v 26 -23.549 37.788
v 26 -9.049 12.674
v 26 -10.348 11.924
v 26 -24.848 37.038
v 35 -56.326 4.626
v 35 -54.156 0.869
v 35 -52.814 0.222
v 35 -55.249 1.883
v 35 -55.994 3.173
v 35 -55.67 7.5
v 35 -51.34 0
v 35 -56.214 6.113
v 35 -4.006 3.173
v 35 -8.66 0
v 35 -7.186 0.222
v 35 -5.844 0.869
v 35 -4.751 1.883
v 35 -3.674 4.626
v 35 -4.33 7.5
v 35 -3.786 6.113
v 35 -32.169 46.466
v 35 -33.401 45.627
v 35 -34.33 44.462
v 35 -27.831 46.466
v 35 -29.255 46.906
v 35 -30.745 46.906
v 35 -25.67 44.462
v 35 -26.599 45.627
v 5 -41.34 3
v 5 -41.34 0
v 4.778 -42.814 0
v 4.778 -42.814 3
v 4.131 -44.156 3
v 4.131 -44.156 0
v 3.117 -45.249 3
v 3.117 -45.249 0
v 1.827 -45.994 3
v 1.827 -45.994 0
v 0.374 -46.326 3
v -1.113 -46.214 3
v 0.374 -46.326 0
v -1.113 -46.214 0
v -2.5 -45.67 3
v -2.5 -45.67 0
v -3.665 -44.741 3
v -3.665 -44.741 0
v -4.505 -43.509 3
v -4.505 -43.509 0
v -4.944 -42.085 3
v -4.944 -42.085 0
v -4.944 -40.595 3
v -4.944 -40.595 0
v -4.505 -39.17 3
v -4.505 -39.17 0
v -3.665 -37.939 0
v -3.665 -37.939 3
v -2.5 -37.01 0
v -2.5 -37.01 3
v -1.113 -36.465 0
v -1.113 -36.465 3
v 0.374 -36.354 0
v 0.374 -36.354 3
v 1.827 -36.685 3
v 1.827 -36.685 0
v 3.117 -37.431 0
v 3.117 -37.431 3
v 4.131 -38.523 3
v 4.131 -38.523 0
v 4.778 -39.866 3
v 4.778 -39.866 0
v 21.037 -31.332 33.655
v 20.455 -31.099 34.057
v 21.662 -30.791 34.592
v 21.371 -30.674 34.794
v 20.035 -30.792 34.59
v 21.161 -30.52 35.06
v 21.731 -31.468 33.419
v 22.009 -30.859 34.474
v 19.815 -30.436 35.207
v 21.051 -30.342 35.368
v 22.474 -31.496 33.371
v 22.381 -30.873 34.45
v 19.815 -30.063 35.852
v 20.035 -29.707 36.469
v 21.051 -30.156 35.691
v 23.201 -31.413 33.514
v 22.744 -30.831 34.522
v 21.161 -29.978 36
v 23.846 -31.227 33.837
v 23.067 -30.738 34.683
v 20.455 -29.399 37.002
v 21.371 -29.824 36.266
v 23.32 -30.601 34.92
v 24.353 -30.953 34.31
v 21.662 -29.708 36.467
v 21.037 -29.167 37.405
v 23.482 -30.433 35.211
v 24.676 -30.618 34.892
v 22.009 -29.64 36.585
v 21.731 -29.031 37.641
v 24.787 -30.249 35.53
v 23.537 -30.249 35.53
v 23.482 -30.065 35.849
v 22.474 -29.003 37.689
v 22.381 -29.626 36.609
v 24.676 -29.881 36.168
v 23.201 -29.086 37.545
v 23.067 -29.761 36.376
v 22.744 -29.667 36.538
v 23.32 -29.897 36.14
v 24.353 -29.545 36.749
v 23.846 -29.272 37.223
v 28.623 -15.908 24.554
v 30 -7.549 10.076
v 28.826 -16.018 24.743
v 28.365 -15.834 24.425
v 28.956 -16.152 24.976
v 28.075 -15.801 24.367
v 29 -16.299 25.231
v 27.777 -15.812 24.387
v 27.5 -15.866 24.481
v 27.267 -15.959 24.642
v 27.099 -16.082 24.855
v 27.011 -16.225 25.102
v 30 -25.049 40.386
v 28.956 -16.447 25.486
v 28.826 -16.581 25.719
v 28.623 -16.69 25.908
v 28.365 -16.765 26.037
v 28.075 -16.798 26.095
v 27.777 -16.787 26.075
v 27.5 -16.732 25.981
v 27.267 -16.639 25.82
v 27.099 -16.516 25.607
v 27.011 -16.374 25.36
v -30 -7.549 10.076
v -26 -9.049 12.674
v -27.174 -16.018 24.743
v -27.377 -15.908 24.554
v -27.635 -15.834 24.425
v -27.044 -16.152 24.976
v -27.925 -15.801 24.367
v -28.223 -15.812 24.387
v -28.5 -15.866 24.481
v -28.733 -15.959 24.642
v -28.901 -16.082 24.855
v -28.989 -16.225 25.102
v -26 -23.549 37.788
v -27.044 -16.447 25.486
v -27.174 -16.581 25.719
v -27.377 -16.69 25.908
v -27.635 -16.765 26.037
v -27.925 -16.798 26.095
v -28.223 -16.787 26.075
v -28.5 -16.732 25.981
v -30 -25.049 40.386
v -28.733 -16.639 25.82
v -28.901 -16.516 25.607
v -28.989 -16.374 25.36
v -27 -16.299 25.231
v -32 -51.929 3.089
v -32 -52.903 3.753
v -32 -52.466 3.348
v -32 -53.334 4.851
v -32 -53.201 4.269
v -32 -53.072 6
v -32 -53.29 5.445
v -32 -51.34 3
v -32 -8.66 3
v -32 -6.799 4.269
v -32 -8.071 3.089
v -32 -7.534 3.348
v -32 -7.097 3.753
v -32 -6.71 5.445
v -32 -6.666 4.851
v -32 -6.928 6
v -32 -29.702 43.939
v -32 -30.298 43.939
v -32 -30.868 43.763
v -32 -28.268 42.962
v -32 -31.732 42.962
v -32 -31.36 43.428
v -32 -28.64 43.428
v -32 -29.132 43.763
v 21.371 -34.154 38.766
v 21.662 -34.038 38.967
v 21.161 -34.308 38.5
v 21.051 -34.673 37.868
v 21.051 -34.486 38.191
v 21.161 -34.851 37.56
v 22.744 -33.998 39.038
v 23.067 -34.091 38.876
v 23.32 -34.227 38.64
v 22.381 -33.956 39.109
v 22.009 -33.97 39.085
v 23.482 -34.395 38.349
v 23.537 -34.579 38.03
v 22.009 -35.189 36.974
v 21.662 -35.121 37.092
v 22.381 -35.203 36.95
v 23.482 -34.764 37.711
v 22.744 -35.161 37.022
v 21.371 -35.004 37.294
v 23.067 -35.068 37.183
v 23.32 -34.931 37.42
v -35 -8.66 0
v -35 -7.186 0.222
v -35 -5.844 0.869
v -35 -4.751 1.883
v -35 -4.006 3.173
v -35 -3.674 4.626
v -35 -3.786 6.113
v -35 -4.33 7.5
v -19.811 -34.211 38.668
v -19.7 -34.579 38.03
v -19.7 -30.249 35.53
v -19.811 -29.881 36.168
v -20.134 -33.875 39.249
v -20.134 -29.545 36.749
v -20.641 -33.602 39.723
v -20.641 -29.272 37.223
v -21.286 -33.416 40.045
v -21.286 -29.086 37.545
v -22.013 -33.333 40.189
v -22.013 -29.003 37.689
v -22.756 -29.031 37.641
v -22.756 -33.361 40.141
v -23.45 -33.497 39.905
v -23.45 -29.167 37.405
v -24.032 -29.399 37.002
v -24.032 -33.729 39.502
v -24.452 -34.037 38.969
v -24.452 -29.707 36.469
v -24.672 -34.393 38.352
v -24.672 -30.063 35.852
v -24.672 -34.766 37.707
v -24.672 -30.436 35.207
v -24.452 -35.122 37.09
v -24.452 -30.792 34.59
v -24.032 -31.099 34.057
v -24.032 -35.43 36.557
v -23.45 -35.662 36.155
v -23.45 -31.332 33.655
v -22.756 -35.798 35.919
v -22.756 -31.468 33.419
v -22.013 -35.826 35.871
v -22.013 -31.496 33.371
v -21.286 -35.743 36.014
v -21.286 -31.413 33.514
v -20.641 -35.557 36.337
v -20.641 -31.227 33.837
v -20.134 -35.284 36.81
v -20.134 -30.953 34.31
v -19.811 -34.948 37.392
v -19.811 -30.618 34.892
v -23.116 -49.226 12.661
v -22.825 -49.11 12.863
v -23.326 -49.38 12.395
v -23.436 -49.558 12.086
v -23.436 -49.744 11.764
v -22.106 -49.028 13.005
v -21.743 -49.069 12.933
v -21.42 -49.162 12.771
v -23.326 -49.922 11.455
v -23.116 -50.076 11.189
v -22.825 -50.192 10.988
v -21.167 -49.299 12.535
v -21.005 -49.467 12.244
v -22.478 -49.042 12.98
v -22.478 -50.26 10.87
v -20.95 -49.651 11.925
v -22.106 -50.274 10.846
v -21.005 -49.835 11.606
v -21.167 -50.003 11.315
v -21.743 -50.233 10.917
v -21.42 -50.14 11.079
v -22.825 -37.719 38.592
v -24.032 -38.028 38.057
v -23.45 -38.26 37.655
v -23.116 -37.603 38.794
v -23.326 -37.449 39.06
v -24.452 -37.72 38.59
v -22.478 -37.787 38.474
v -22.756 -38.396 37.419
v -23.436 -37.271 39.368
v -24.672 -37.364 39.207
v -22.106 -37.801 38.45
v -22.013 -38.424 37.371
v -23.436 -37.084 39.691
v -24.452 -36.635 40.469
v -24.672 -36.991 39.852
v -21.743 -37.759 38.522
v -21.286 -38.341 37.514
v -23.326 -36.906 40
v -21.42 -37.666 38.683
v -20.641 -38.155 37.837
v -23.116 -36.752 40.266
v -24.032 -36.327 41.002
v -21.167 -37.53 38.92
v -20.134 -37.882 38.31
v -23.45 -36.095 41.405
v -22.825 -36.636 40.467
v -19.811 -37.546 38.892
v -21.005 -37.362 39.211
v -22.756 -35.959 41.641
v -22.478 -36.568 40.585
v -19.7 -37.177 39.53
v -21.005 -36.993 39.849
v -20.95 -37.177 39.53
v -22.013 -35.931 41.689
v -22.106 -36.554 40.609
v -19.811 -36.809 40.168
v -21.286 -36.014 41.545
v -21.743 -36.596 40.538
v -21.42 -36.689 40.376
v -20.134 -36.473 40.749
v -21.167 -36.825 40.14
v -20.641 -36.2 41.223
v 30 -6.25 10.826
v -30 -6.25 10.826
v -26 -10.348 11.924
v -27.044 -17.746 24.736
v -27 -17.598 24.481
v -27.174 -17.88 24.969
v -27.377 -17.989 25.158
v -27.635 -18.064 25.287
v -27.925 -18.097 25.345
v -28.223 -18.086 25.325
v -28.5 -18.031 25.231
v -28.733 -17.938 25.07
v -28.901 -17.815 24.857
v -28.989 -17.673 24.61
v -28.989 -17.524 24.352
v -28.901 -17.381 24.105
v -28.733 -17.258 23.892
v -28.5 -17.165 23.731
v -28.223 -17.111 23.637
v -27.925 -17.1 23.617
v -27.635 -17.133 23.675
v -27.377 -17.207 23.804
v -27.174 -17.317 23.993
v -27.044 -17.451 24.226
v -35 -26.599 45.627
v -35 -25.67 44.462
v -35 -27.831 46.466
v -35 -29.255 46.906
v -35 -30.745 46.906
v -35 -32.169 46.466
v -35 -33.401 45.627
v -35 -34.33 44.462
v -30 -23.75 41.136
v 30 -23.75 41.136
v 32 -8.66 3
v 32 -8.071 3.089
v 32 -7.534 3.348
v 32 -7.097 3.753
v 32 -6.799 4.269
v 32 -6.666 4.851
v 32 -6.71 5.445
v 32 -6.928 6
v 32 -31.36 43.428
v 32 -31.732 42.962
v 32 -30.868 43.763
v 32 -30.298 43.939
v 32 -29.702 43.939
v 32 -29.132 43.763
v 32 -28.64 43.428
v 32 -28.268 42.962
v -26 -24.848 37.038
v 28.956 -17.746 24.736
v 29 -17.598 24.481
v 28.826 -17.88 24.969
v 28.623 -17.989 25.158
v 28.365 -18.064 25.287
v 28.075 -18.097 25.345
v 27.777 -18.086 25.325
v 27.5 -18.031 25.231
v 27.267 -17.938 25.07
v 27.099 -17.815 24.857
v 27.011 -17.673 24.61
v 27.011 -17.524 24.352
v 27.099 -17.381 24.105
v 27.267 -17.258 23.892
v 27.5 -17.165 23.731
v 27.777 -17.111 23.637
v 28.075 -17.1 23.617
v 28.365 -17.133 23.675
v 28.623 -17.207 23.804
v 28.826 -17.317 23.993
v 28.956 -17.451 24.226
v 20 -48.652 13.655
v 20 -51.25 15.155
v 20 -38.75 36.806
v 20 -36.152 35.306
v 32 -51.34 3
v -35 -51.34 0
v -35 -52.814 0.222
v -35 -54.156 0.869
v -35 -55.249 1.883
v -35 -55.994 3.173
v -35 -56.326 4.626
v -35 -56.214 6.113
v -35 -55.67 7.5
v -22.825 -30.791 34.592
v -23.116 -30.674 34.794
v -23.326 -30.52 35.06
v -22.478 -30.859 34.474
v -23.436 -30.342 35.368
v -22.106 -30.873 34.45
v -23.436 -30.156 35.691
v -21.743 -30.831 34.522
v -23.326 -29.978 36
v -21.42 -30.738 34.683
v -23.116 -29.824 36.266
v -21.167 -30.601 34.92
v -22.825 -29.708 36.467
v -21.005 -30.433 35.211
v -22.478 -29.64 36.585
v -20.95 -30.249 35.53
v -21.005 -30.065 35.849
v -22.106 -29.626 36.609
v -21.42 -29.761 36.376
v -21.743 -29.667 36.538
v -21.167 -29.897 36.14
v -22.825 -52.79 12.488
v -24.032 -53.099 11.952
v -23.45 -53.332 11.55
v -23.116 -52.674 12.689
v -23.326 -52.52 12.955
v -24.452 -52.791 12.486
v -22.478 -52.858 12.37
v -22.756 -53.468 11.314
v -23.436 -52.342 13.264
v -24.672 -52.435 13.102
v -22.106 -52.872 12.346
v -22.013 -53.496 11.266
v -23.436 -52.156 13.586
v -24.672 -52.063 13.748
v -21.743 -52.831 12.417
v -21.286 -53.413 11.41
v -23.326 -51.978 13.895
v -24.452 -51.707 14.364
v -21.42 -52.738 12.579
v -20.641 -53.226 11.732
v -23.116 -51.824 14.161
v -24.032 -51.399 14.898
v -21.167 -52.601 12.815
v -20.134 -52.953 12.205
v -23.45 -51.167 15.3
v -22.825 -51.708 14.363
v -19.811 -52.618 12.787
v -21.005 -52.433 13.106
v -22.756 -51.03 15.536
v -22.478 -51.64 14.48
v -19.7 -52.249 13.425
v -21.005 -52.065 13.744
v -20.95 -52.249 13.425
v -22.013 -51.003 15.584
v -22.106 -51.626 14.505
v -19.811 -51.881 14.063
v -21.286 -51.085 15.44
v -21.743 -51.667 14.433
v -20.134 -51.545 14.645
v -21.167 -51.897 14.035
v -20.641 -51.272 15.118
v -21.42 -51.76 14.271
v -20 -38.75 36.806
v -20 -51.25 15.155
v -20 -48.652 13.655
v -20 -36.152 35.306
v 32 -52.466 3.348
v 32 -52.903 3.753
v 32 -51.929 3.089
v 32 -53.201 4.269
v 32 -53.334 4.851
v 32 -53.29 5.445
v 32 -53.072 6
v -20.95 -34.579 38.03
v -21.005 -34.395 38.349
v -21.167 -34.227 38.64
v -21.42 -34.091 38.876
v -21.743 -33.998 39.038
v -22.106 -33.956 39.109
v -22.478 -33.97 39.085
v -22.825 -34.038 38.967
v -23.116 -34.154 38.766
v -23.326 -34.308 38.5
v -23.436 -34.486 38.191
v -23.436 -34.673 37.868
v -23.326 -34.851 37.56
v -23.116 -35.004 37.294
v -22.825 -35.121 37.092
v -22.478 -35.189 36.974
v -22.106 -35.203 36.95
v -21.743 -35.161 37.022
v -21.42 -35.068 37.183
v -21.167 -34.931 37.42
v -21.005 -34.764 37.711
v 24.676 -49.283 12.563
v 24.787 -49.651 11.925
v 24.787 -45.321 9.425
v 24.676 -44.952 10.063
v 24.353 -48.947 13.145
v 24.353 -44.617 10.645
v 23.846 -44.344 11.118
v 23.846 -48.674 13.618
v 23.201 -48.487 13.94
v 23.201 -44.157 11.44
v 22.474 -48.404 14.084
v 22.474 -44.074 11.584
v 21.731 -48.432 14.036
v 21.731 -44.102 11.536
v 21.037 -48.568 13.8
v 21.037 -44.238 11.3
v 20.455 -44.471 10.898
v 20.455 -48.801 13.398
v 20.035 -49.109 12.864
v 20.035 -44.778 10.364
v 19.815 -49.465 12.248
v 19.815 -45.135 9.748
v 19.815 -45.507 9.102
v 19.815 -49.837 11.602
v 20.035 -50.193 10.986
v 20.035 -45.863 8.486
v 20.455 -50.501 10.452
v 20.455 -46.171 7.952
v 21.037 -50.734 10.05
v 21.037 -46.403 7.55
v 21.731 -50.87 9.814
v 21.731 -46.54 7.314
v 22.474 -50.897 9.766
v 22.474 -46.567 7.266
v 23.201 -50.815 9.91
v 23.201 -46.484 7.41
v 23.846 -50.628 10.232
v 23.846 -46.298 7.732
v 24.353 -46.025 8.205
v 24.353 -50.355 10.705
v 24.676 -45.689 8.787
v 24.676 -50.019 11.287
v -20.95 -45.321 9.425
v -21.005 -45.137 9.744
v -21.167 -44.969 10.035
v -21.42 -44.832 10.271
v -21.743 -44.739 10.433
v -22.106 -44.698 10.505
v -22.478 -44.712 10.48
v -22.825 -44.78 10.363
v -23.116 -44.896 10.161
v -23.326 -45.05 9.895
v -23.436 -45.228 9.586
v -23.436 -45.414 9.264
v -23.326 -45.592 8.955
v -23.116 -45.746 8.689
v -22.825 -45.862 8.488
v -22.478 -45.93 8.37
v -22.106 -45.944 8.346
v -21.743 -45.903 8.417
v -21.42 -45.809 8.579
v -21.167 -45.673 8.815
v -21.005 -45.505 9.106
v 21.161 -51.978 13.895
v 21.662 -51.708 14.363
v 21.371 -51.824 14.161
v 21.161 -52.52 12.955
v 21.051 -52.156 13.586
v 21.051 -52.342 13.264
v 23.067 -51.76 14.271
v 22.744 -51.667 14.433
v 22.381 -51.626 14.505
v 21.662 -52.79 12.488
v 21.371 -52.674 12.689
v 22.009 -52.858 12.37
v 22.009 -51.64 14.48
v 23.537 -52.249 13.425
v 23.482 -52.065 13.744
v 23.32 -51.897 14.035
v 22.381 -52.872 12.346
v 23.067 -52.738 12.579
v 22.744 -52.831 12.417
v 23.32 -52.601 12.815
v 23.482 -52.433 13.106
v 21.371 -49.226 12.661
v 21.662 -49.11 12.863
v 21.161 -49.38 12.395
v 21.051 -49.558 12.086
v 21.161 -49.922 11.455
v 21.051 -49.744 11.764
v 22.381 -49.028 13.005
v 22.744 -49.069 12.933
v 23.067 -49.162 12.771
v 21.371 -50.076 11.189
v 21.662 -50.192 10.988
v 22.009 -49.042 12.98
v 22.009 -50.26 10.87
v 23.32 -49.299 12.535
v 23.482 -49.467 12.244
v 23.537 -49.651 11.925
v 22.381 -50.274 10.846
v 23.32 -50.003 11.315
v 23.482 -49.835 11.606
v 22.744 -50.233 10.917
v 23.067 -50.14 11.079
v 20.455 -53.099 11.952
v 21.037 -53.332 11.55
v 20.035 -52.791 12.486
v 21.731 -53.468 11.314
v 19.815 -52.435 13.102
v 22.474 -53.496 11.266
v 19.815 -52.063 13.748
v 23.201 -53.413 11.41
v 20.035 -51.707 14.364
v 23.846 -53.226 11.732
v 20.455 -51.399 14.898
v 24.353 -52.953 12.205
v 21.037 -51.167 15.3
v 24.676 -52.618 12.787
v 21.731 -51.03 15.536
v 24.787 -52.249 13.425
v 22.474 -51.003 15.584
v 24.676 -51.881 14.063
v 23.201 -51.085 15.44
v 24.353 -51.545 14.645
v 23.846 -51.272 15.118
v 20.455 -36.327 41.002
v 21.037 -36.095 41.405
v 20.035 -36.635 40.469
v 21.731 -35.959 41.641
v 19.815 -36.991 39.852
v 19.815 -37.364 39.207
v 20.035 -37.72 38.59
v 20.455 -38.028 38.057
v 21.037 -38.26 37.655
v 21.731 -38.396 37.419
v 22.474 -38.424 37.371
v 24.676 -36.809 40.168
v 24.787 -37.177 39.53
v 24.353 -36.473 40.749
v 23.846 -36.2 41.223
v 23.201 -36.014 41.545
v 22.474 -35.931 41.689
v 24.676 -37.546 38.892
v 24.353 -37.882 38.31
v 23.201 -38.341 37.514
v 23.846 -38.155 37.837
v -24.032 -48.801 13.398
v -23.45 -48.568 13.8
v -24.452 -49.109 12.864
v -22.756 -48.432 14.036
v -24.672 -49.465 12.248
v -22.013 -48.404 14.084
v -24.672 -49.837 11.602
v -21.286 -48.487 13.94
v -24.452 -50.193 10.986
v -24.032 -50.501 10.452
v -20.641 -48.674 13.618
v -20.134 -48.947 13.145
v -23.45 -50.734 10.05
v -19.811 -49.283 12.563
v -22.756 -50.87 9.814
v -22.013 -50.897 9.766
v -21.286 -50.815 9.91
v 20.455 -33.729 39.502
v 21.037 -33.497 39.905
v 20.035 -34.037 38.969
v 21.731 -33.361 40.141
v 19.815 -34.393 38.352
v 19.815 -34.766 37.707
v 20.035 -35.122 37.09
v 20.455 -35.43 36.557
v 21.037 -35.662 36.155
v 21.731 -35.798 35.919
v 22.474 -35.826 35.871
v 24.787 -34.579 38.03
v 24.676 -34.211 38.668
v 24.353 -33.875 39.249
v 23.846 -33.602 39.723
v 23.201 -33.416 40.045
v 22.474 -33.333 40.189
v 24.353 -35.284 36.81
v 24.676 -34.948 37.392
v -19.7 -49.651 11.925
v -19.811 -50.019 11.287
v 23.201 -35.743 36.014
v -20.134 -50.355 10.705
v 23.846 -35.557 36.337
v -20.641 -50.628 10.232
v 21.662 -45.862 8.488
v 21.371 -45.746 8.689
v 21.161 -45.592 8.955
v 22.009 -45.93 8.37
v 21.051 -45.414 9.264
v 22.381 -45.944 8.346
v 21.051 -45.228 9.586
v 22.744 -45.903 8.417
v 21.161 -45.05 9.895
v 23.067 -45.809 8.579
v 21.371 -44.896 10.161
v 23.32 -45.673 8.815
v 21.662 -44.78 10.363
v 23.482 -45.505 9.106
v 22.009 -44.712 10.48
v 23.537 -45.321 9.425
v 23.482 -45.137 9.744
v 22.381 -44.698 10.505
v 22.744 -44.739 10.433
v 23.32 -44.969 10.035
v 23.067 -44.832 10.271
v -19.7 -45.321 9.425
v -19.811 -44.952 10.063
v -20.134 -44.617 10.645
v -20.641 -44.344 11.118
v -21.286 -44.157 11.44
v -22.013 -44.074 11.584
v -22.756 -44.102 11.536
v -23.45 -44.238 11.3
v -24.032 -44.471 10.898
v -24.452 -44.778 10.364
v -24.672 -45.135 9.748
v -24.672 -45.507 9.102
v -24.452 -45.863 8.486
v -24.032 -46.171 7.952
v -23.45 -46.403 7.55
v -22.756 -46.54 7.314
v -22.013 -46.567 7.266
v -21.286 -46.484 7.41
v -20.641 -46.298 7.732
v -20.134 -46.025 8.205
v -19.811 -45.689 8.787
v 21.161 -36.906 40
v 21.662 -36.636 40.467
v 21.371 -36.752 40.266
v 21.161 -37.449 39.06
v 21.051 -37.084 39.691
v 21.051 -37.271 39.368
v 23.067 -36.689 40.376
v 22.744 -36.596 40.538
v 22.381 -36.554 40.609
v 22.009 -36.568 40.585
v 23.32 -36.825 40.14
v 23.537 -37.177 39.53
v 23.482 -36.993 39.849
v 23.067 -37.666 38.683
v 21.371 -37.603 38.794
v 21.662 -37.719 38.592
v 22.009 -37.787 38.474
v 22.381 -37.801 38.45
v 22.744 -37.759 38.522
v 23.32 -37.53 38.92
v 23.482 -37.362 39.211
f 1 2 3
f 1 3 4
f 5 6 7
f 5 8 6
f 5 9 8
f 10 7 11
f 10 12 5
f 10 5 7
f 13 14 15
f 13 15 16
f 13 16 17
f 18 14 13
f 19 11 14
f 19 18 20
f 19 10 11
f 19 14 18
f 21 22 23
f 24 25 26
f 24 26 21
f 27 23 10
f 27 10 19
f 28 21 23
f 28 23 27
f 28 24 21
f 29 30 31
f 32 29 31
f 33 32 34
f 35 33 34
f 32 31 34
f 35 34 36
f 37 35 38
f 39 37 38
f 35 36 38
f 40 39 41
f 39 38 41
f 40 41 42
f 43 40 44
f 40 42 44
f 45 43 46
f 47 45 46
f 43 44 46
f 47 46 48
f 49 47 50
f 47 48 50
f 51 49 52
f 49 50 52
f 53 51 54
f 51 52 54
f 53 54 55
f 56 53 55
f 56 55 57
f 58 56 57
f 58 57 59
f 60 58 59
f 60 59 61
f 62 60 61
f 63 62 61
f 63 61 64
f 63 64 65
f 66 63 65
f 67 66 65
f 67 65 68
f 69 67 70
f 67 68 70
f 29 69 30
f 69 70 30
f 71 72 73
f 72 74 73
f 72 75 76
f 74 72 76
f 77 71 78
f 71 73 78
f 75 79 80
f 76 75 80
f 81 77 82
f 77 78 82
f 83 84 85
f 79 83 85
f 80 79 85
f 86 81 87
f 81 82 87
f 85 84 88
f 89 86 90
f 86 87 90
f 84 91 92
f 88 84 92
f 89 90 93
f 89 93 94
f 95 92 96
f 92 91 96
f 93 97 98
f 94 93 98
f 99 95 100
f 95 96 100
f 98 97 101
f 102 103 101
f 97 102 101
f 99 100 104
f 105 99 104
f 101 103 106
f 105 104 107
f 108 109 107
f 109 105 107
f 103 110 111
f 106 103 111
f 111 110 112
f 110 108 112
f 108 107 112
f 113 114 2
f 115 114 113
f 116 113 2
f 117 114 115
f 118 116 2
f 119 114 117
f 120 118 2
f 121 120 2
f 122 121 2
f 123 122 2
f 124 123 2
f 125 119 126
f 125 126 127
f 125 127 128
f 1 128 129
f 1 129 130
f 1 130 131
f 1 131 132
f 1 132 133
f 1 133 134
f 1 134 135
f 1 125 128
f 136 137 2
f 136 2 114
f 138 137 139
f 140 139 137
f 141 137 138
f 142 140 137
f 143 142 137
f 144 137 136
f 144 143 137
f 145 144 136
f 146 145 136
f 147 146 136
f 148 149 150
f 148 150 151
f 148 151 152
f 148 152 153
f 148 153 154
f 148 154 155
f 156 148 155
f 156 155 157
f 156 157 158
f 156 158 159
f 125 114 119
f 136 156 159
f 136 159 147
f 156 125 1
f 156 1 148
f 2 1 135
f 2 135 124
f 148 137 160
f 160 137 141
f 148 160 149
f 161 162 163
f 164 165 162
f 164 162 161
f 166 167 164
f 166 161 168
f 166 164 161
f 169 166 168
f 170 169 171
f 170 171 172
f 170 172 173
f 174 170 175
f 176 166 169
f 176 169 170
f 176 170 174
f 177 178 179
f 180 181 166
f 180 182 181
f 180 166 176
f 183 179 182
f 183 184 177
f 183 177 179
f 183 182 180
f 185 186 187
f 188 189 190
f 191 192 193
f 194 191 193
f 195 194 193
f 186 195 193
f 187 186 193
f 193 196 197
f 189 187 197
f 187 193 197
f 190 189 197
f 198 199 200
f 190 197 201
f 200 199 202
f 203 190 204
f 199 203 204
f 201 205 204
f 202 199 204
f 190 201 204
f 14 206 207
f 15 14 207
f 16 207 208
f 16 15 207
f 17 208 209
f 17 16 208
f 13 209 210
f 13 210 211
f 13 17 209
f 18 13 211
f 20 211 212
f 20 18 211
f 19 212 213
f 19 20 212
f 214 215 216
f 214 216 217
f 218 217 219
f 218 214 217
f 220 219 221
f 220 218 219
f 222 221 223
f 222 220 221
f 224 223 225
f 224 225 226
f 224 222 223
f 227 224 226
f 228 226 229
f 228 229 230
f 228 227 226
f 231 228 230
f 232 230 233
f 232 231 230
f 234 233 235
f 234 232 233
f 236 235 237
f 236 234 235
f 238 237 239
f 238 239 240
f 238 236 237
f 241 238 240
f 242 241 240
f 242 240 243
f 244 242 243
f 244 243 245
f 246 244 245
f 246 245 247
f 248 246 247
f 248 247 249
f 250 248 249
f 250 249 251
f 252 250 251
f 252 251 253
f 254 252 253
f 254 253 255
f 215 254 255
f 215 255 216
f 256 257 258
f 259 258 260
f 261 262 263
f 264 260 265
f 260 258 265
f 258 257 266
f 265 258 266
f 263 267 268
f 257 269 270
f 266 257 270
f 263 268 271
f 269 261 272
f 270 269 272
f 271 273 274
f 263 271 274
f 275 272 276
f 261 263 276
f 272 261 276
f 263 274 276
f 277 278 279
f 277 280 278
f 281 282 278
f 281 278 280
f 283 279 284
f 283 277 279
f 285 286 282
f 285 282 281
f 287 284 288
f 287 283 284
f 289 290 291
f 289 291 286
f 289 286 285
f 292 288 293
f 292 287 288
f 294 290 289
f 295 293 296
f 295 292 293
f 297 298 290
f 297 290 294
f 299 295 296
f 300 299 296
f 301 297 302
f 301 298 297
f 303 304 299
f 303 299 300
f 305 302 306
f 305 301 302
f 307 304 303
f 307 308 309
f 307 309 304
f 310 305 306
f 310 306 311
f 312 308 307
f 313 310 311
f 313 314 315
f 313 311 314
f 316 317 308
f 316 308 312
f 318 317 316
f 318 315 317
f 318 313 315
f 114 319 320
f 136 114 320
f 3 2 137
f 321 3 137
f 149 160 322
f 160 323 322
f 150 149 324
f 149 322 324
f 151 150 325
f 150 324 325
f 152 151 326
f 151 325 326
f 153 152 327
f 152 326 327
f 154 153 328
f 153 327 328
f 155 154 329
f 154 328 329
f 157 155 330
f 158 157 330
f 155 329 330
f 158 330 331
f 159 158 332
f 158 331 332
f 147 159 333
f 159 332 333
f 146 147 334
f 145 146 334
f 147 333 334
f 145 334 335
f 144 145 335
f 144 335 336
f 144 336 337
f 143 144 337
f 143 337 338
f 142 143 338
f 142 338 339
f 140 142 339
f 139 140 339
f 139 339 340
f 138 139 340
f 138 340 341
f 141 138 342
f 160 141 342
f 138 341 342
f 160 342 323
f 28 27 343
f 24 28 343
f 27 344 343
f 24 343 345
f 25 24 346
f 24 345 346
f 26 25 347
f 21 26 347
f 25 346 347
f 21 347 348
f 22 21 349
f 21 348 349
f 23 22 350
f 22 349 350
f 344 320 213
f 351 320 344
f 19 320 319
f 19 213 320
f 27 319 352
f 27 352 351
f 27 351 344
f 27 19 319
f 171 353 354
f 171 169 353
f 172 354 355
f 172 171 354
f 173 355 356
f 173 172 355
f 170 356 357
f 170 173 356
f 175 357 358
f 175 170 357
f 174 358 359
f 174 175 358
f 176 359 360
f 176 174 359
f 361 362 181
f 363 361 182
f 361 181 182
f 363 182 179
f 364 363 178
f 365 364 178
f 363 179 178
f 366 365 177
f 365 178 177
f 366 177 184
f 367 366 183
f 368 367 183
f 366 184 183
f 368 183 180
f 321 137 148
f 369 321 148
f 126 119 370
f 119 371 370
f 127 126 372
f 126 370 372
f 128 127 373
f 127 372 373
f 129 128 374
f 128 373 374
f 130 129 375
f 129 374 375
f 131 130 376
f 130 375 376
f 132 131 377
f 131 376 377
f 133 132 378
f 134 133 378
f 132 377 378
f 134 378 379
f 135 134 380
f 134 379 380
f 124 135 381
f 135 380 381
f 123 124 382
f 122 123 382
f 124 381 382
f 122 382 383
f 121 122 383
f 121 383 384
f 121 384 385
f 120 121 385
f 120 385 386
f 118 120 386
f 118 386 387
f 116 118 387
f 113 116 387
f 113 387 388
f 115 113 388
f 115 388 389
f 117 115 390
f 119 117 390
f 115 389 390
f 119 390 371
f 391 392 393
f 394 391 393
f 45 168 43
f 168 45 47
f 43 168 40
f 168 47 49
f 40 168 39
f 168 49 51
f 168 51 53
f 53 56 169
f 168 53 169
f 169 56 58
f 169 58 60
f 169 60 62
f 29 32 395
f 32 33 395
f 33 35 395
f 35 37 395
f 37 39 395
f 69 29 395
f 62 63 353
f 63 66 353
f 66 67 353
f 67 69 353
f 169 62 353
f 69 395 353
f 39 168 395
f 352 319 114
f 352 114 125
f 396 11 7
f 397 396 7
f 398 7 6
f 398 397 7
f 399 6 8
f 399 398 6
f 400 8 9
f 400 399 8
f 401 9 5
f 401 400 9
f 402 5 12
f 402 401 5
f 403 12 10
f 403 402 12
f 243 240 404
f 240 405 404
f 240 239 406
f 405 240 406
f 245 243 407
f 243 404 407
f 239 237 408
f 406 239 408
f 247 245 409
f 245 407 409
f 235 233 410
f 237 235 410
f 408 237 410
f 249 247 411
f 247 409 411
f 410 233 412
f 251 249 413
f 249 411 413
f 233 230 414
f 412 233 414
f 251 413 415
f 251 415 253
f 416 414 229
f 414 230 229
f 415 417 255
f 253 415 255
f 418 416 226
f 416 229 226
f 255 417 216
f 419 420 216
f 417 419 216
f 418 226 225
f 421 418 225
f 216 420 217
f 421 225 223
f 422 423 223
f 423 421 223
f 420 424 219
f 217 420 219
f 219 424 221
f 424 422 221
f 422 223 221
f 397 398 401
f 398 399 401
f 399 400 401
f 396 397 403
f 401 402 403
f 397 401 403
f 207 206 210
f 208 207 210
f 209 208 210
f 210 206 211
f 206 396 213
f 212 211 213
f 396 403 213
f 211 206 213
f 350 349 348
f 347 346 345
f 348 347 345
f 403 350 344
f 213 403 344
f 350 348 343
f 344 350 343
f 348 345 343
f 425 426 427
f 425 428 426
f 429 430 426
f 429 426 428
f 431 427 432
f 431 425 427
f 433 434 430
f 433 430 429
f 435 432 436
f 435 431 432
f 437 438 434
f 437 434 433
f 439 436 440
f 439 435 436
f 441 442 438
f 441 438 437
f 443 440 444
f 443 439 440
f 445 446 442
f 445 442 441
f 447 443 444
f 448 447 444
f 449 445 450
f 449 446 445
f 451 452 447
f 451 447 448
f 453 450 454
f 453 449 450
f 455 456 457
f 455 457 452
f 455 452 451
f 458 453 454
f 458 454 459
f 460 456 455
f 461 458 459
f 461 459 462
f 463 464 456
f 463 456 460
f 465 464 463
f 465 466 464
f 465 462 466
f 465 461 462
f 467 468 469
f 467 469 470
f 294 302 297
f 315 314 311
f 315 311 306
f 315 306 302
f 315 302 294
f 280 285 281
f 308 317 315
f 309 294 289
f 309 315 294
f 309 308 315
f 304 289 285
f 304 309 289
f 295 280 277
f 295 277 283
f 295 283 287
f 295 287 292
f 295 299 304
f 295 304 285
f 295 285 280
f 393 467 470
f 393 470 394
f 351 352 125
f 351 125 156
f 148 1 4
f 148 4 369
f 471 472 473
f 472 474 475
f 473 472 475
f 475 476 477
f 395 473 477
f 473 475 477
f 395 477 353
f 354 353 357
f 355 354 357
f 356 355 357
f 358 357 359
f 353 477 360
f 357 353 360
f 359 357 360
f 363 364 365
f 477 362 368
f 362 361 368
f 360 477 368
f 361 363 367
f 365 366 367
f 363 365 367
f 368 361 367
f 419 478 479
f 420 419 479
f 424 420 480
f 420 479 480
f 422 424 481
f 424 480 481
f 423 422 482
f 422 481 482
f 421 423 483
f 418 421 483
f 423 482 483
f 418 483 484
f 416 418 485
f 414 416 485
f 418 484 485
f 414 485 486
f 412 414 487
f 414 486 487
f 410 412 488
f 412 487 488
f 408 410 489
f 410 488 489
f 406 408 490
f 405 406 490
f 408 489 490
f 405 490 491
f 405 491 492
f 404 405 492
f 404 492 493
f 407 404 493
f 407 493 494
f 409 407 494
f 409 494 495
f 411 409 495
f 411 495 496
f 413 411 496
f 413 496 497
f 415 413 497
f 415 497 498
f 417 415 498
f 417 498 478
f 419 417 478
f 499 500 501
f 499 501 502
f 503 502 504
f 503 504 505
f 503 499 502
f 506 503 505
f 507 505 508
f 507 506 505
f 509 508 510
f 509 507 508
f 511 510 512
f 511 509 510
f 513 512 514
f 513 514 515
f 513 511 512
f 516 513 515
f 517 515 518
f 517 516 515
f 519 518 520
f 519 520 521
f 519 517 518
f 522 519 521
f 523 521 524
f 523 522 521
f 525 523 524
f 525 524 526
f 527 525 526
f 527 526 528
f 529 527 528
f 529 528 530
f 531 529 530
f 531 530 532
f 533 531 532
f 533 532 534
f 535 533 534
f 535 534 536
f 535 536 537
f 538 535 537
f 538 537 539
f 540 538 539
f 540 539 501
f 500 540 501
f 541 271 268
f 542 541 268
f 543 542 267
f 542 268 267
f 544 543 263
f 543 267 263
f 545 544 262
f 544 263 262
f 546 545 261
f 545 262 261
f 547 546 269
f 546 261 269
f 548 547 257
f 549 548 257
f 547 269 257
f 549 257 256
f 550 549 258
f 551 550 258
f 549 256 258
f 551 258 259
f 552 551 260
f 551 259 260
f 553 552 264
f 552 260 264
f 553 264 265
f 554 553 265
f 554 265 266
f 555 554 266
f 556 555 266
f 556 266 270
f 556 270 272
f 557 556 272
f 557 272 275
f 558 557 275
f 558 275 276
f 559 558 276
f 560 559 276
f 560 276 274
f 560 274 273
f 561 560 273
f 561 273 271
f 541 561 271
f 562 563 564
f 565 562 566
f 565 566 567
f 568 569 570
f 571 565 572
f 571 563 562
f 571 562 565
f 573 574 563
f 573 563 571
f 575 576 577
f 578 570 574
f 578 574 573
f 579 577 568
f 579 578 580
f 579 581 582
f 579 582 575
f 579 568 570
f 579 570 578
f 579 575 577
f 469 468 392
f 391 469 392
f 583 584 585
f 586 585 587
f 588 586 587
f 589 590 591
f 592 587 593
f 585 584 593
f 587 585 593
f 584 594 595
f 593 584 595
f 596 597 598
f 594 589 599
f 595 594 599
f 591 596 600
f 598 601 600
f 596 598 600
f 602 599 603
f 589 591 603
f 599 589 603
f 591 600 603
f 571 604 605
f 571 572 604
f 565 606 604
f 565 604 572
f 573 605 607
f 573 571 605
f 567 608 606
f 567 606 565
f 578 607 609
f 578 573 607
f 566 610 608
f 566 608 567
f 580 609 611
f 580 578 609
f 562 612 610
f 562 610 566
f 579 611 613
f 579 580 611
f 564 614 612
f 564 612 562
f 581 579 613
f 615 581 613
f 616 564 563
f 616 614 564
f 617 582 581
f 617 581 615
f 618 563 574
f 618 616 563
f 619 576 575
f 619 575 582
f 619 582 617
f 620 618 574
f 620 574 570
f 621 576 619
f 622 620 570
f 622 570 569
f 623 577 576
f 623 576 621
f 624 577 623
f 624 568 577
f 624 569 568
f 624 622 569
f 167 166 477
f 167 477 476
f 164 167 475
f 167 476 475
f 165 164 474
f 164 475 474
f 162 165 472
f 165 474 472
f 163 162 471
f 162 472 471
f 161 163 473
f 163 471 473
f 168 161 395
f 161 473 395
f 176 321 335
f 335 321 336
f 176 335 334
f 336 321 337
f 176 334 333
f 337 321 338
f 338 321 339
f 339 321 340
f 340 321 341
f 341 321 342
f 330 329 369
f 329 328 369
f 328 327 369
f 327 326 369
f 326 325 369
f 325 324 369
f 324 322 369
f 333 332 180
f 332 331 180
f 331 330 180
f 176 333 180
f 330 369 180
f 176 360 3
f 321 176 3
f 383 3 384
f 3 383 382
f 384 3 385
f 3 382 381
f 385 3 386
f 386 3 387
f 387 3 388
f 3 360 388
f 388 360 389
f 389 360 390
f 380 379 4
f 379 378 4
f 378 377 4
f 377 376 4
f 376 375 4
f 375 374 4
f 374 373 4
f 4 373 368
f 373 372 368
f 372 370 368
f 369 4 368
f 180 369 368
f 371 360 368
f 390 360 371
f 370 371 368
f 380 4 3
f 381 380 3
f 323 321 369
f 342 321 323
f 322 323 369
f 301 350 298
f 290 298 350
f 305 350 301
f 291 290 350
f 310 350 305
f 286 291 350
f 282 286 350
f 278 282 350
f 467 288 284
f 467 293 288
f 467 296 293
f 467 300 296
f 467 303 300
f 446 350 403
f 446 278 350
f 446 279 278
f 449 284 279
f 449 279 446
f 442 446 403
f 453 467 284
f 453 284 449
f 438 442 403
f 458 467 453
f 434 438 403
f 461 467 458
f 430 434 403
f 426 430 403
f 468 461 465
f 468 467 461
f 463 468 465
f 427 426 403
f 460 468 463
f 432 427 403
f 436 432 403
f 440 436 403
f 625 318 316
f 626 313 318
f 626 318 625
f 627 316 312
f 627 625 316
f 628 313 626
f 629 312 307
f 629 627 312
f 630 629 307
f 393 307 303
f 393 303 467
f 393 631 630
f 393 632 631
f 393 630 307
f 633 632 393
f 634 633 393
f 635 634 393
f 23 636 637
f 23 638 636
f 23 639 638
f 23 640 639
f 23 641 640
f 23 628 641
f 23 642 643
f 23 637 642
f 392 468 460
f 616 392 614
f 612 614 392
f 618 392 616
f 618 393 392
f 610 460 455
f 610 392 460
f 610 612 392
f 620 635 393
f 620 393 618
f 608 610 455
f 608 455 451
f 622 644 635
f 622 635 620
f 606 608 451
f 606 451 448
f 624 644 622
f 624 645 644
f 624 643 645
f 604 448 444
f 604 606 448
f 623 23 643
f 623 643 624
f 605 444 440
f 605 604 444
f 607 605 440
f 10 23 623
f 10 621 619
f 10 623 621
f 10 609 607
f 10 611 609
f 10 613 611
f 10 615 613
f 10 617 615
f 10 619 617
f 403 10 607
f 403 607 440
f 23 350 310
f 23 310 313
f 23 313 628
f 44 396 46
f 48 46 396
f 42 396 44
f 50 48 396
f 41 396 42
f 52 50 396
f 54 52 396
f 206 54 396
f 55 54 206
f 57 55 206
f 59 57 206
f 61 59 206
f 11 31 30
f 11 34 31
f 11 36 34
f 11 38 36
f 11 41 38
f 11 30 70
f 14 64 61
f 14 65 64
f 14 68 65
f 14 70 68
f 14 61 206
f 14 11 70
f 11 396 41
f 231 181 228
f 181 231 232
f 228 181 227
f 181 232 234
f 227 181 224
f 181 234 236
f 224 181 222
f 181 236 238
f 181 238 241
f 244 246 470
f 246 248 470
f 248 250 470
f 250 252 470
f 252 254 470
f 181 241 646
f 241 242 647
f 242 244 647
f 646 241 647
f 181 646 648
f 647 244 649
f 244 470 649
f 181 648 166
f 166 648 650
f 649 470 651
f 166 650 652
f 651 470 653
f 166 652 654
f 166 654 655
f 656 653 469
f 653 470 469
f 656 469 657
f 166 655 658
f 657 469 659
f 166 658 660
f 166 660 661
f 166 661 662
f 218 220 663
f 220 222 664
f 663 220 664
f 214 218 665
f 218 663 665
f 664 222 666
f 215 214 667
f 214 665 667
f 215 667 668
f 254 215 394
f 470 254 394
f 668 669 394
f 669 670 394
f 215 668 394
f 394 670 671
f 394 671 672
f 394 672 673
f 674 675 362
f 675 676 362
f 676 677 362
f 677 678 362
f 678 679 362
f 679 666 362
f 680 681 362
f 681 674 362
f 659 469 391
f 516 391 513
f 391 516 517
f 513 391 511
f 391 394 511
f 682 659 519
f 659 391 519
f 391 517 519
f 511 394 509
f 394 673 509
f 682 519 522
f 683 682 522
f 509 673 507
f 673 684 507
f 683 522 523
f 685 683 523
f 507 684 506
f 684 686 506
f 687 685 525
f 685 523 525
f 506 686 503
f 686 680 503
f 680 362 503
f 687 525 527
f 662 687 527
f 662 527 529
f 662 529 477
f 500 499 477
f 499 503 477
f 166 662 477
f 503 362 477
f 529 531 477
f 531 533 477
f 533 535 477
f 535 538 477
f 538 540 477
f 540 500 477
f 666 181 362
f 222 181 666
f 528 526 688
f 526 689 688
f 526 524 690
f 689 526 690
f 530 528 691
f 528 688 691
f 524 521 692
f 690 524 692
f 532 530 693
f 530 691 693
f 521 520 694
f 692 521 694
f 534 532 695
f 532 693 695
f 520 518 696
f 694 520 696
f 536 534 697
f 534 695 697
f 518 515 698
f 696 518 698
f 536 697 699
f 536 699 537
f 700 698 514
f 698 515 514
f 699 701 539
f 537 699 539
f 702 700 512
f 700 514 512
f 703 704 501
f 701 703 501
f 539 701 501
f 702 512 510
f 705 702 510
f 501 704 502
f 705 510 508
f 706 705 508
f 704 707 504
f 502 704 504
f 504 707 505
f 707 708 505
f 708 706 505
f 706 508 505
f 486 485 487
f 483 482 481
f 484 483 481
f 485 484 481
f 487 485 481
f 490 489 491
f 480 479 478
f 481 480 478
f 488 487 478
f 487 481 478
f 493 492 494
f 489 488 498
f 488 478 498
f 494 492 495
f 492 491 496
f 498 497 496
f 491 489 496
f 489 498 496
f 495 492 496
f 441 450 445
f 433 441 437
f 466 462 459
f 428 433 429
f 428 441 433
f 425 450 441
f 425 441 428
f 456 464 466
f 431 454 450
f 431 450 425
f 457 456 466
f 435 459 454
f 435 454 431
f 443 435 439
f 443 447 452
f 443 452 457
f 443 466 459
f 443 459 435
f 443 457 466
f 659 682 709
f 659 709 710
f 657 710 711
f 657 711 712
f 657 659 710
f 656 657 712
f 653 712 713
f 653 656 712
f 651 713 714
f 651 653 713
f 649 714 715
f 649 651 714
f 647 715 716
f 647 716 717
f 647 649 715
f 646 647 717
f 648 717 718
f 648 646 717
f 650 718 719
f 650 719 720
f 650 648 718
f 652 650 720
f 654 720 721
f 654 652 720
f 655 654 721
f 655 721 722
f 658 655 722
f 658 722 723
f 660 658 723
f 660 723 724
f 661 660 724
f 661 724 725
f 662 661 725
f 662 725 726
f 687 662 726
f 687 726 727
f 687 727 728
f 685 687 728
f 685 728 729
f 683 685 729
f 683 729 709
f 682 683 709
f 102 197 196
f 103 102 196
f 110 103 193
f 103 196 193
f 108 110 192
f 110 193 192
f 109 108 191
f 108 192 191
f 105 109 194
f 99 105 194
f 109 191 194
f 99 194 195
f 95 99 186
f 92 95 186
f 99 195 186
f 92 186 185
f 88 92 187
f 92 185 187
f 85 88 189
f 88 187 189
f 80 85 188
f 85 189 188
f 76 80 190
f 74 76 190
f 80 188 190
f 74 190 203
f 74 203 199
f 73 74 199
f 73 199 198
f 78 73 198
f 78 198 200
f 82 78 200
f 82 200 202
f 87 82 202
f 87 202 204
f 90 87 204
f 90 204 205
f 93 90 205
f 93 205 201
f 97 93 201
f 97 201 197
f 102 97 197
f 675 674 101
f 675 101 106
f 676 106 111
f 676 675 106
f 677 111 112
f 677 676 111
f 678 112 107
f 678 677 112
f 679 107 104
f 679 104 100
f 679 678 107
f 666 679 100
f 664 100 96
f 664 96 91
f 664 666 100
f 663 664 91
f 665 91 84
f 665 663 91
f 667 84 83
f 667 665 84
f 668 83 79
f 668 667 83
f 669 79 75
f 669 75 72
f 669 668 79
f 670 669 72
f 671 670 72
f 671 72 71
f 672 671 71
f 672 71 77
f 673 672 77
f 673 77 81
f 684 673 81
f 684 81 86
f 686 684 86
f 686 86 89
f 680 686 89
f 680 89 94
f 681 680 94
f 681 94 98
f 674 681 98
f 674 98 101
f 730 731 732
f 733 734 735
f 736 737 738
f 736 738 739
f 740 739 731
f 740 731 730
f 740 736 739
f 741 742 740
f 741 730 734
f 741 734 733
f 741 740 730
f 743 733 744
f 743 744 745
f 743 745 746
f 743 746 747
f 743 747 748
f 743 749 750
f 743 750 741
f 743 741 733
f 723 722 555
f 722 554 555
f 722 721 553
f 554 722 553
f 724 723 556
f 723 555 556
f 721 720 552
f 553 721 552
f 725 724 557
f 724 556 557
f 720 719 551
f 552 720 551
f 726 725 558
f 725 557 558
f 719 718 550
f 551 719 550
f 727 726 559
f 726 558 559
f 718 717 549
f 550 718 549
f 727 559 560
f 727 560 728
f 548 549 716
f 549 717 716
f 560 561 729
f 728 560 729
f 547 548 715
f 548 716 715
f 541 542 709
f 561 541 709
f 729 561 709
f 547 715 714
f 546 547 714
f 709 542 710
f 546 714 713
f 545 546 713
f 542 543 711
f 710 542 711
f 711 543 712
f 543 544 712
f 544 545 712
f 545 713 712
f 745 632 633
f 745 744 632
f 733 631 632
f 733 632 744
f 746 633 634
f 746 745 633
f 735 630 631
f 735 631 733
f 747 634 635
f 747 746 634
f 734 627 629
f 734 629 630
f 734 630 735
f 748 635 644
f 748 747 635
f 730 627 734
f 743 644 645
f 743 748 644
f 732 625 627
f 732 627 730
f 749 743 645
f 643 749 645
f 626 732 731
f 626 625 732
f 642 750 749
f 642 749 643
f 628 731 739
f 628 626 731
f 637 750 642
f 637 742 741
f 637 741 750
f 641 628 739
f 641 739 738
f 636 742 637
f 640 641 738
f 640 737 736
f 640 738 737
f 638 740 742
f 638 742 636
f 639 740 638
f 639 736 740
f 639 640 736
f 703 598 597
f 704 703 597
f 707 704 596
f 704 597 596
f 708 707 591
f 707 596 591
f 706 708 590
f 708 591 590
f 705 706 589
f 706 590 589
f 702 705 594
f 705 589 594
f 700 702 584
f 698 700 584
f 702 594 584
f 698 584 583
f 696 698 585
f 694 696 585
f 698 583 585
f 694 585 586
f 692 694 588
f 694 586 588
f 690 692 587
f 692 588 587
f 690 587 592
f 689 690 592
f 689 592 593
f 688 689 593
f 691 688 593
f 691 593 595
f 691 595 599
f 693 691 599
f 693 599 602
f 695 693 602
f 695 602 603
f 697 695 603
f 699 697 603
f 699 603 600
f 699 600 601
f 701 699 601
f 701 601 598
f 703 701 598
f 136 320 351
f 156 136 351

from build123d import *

# Parameters (mm, degrees)
F1_DEPTH  = 35
F2_DEPTH  = 32
F3_R      = 5
F4_R      = 2
F5_W      = 40
F5_H      = 25
F6_DEPTH  = 3
F5_R      = 2.5
F5_R_2    = 1.25
F7_DEPTH  = 8
F8_W      = 52
F8_H      = 29
F9_DEPTH  = 3
F8_W_2    = 60
F8_H_2    = 35
F10_DEPTH = 1.5
F11_R     = 5
F12_DEPTH = 3
F13_D     = 2
F13_DEPTH = 3
F13_TIP   = 0.600860619


with BuildPart() as f1:
    # F0 (on Right) → F1 (new body, symmetric)
    with BuildSketch(Plane.YZ):
        Polygon((-60, 0), (0, 0), (-30, 51.9615242271), align=None)
        Polygon((-5.1961524227, 3), (-54.8038475773, 3), (-30, 45.9615242271), align=None, mode=Mode.SUBTRACT)
        Polygon((-30, 45.9615242271), (-54.8038475773, 3), (-5.1961524227, 3), align=None)
    extrude(amount=F1_DEPTH, both=True)

    # F0 (on Right) → F2 (cut, symmetric)
    with BuildSketch(Plane.YZ):
        Polygon((-30, 45.9615242271), (-54.8038475773, 3), (-5.1961524227, 3), align=None)
    extrude(amount=F2_DEPTH, both=True, mode=Mode.SUBTRACT)

    # F3
    f3_edges = [f1.edges().sort_by_distance(p)[0] for p in [
        (0, -30, 51.961524),
        (0, -60, 0),
        (0, 0, 0),
    ]]
    fillet(f3_edges, radius=F3_R)

    # F4
    f4_edges = [f1.edges().sort_by_distance(p)[0] for p in [
        (0, -30, 45.961524),
        (0, -5.196152, 3),
        (0, -54.803848, 3),
    ]]
    fillet(f4_edges, radius=F4_R)

    # F5 (on face) → F6 (cut)
    with BuildSketch(Plane(origin=(0, -45, 25.9807621135), x_dir=(1, 0, 0), z_dir=(0, -0.8660254038, 0.5))):
        with Locations((0, -0.0002540378)):
            Rectangle(F5_W, F5_H)
    extrude(amount=-F6_DEPTH, mode=Mode.SUBTRACT)

    # F5 (on face) → F7 (join)
    with BuildSketch(Plane(origin=(0, -45, 25.9807621135), x_dir=(1, 0, 0), z_dir=(0, -0.8660254038, 0.5))):
        with Locations((-22.1997145563, 15.6450960785)):
            Circle(F5_R)
        with Locations((-22.1997145563, 15.6450960785)):
            Circle(F5_R_2, mode=Mode.SUBTRACT)
        with Locations((22.287291775, 15.6450960785)):
            Circle(F5_R)
        with Locations((22.287291775, 15.6450960785)):
            Circle(F5_R_2, mode=Mode.SUBTRACT)
        with Locations((22.287291775, -14.4981121665)):
            Circle(F5_R)
        with Locations((22.287291775, -14.4981121665)):
            Circle(F5_R_2, mode=Mode.SUBTRACT)
        with Locations((-22.1997145563, -14.4981121665)):
            Circle(F5_R)
        with Locations((-22.1997145563, -14.4981121665)):
            Circle(F5_R_2, mode=Mode.SUBTRACT)
    extrude(amount=-F7_DEPTH)

    # F8 (on face) → F9 (cut)
    with BuildSketch(Plane(origin=(0, 0, 0), x_dir=(-1, 0, 0), z_dir=(0, 0.8660254038, 0.5))):
        with Locations((0, 30.0002540378)):
            Rectangle(F8_W, F8_H)
    extrude(amount=-F9_DEPTH, mode=Mode.SUBTRACT)

    # F8 (on face) → F10 (cut)
    with BuildSketch(Plane(origin=(0, 0, 0), x_dir=(-1, 0, 0), z_dir=(0, 0.8660254038, 0.5))):
        with Locations((0, 30.0002540378)):
            Rectangle(F8_W_2, F8_H_2)
        with Locations((0, 30.0002540378)):
            Rectangle(F8_W, F8_H, mode=Mode.SUBTRACT)
    extrude(amount=-F10_DEPTH, mode=Mode.SUBTRACT)

    # F11 (on face) → F12 (cut, through all)
    with BuildSketch(Plane(origin=(0, 0, 0), x_dir=(1, 0, 0), z_dir=(0, 0, -1))):
        with Locations((0, 41.3397459622)):
            Circle(F11_R)
    extrude(amount=-F12_DEPTH, mode=Mode.SUBTRACT)

    # F13
    with Locations(Plane(origin=(0, 0, 0), x_dir=(-1, 0, 0), z_dir=(0, 0.8660254038, 0.5))):
        with Locations((-28, 30.0002540378), (28, 30.0002540378)):
            Hole(F13_D / 2, depth=F13_DEPTH)
            with Locations((0, 0, -(F13_DEPTH + F13_TIP / 2))):  # 118° drill point
                Cone(0, F13_D / 2, F13_TIP, mode=Mode.SUBTRACT)


solid = f1.part
